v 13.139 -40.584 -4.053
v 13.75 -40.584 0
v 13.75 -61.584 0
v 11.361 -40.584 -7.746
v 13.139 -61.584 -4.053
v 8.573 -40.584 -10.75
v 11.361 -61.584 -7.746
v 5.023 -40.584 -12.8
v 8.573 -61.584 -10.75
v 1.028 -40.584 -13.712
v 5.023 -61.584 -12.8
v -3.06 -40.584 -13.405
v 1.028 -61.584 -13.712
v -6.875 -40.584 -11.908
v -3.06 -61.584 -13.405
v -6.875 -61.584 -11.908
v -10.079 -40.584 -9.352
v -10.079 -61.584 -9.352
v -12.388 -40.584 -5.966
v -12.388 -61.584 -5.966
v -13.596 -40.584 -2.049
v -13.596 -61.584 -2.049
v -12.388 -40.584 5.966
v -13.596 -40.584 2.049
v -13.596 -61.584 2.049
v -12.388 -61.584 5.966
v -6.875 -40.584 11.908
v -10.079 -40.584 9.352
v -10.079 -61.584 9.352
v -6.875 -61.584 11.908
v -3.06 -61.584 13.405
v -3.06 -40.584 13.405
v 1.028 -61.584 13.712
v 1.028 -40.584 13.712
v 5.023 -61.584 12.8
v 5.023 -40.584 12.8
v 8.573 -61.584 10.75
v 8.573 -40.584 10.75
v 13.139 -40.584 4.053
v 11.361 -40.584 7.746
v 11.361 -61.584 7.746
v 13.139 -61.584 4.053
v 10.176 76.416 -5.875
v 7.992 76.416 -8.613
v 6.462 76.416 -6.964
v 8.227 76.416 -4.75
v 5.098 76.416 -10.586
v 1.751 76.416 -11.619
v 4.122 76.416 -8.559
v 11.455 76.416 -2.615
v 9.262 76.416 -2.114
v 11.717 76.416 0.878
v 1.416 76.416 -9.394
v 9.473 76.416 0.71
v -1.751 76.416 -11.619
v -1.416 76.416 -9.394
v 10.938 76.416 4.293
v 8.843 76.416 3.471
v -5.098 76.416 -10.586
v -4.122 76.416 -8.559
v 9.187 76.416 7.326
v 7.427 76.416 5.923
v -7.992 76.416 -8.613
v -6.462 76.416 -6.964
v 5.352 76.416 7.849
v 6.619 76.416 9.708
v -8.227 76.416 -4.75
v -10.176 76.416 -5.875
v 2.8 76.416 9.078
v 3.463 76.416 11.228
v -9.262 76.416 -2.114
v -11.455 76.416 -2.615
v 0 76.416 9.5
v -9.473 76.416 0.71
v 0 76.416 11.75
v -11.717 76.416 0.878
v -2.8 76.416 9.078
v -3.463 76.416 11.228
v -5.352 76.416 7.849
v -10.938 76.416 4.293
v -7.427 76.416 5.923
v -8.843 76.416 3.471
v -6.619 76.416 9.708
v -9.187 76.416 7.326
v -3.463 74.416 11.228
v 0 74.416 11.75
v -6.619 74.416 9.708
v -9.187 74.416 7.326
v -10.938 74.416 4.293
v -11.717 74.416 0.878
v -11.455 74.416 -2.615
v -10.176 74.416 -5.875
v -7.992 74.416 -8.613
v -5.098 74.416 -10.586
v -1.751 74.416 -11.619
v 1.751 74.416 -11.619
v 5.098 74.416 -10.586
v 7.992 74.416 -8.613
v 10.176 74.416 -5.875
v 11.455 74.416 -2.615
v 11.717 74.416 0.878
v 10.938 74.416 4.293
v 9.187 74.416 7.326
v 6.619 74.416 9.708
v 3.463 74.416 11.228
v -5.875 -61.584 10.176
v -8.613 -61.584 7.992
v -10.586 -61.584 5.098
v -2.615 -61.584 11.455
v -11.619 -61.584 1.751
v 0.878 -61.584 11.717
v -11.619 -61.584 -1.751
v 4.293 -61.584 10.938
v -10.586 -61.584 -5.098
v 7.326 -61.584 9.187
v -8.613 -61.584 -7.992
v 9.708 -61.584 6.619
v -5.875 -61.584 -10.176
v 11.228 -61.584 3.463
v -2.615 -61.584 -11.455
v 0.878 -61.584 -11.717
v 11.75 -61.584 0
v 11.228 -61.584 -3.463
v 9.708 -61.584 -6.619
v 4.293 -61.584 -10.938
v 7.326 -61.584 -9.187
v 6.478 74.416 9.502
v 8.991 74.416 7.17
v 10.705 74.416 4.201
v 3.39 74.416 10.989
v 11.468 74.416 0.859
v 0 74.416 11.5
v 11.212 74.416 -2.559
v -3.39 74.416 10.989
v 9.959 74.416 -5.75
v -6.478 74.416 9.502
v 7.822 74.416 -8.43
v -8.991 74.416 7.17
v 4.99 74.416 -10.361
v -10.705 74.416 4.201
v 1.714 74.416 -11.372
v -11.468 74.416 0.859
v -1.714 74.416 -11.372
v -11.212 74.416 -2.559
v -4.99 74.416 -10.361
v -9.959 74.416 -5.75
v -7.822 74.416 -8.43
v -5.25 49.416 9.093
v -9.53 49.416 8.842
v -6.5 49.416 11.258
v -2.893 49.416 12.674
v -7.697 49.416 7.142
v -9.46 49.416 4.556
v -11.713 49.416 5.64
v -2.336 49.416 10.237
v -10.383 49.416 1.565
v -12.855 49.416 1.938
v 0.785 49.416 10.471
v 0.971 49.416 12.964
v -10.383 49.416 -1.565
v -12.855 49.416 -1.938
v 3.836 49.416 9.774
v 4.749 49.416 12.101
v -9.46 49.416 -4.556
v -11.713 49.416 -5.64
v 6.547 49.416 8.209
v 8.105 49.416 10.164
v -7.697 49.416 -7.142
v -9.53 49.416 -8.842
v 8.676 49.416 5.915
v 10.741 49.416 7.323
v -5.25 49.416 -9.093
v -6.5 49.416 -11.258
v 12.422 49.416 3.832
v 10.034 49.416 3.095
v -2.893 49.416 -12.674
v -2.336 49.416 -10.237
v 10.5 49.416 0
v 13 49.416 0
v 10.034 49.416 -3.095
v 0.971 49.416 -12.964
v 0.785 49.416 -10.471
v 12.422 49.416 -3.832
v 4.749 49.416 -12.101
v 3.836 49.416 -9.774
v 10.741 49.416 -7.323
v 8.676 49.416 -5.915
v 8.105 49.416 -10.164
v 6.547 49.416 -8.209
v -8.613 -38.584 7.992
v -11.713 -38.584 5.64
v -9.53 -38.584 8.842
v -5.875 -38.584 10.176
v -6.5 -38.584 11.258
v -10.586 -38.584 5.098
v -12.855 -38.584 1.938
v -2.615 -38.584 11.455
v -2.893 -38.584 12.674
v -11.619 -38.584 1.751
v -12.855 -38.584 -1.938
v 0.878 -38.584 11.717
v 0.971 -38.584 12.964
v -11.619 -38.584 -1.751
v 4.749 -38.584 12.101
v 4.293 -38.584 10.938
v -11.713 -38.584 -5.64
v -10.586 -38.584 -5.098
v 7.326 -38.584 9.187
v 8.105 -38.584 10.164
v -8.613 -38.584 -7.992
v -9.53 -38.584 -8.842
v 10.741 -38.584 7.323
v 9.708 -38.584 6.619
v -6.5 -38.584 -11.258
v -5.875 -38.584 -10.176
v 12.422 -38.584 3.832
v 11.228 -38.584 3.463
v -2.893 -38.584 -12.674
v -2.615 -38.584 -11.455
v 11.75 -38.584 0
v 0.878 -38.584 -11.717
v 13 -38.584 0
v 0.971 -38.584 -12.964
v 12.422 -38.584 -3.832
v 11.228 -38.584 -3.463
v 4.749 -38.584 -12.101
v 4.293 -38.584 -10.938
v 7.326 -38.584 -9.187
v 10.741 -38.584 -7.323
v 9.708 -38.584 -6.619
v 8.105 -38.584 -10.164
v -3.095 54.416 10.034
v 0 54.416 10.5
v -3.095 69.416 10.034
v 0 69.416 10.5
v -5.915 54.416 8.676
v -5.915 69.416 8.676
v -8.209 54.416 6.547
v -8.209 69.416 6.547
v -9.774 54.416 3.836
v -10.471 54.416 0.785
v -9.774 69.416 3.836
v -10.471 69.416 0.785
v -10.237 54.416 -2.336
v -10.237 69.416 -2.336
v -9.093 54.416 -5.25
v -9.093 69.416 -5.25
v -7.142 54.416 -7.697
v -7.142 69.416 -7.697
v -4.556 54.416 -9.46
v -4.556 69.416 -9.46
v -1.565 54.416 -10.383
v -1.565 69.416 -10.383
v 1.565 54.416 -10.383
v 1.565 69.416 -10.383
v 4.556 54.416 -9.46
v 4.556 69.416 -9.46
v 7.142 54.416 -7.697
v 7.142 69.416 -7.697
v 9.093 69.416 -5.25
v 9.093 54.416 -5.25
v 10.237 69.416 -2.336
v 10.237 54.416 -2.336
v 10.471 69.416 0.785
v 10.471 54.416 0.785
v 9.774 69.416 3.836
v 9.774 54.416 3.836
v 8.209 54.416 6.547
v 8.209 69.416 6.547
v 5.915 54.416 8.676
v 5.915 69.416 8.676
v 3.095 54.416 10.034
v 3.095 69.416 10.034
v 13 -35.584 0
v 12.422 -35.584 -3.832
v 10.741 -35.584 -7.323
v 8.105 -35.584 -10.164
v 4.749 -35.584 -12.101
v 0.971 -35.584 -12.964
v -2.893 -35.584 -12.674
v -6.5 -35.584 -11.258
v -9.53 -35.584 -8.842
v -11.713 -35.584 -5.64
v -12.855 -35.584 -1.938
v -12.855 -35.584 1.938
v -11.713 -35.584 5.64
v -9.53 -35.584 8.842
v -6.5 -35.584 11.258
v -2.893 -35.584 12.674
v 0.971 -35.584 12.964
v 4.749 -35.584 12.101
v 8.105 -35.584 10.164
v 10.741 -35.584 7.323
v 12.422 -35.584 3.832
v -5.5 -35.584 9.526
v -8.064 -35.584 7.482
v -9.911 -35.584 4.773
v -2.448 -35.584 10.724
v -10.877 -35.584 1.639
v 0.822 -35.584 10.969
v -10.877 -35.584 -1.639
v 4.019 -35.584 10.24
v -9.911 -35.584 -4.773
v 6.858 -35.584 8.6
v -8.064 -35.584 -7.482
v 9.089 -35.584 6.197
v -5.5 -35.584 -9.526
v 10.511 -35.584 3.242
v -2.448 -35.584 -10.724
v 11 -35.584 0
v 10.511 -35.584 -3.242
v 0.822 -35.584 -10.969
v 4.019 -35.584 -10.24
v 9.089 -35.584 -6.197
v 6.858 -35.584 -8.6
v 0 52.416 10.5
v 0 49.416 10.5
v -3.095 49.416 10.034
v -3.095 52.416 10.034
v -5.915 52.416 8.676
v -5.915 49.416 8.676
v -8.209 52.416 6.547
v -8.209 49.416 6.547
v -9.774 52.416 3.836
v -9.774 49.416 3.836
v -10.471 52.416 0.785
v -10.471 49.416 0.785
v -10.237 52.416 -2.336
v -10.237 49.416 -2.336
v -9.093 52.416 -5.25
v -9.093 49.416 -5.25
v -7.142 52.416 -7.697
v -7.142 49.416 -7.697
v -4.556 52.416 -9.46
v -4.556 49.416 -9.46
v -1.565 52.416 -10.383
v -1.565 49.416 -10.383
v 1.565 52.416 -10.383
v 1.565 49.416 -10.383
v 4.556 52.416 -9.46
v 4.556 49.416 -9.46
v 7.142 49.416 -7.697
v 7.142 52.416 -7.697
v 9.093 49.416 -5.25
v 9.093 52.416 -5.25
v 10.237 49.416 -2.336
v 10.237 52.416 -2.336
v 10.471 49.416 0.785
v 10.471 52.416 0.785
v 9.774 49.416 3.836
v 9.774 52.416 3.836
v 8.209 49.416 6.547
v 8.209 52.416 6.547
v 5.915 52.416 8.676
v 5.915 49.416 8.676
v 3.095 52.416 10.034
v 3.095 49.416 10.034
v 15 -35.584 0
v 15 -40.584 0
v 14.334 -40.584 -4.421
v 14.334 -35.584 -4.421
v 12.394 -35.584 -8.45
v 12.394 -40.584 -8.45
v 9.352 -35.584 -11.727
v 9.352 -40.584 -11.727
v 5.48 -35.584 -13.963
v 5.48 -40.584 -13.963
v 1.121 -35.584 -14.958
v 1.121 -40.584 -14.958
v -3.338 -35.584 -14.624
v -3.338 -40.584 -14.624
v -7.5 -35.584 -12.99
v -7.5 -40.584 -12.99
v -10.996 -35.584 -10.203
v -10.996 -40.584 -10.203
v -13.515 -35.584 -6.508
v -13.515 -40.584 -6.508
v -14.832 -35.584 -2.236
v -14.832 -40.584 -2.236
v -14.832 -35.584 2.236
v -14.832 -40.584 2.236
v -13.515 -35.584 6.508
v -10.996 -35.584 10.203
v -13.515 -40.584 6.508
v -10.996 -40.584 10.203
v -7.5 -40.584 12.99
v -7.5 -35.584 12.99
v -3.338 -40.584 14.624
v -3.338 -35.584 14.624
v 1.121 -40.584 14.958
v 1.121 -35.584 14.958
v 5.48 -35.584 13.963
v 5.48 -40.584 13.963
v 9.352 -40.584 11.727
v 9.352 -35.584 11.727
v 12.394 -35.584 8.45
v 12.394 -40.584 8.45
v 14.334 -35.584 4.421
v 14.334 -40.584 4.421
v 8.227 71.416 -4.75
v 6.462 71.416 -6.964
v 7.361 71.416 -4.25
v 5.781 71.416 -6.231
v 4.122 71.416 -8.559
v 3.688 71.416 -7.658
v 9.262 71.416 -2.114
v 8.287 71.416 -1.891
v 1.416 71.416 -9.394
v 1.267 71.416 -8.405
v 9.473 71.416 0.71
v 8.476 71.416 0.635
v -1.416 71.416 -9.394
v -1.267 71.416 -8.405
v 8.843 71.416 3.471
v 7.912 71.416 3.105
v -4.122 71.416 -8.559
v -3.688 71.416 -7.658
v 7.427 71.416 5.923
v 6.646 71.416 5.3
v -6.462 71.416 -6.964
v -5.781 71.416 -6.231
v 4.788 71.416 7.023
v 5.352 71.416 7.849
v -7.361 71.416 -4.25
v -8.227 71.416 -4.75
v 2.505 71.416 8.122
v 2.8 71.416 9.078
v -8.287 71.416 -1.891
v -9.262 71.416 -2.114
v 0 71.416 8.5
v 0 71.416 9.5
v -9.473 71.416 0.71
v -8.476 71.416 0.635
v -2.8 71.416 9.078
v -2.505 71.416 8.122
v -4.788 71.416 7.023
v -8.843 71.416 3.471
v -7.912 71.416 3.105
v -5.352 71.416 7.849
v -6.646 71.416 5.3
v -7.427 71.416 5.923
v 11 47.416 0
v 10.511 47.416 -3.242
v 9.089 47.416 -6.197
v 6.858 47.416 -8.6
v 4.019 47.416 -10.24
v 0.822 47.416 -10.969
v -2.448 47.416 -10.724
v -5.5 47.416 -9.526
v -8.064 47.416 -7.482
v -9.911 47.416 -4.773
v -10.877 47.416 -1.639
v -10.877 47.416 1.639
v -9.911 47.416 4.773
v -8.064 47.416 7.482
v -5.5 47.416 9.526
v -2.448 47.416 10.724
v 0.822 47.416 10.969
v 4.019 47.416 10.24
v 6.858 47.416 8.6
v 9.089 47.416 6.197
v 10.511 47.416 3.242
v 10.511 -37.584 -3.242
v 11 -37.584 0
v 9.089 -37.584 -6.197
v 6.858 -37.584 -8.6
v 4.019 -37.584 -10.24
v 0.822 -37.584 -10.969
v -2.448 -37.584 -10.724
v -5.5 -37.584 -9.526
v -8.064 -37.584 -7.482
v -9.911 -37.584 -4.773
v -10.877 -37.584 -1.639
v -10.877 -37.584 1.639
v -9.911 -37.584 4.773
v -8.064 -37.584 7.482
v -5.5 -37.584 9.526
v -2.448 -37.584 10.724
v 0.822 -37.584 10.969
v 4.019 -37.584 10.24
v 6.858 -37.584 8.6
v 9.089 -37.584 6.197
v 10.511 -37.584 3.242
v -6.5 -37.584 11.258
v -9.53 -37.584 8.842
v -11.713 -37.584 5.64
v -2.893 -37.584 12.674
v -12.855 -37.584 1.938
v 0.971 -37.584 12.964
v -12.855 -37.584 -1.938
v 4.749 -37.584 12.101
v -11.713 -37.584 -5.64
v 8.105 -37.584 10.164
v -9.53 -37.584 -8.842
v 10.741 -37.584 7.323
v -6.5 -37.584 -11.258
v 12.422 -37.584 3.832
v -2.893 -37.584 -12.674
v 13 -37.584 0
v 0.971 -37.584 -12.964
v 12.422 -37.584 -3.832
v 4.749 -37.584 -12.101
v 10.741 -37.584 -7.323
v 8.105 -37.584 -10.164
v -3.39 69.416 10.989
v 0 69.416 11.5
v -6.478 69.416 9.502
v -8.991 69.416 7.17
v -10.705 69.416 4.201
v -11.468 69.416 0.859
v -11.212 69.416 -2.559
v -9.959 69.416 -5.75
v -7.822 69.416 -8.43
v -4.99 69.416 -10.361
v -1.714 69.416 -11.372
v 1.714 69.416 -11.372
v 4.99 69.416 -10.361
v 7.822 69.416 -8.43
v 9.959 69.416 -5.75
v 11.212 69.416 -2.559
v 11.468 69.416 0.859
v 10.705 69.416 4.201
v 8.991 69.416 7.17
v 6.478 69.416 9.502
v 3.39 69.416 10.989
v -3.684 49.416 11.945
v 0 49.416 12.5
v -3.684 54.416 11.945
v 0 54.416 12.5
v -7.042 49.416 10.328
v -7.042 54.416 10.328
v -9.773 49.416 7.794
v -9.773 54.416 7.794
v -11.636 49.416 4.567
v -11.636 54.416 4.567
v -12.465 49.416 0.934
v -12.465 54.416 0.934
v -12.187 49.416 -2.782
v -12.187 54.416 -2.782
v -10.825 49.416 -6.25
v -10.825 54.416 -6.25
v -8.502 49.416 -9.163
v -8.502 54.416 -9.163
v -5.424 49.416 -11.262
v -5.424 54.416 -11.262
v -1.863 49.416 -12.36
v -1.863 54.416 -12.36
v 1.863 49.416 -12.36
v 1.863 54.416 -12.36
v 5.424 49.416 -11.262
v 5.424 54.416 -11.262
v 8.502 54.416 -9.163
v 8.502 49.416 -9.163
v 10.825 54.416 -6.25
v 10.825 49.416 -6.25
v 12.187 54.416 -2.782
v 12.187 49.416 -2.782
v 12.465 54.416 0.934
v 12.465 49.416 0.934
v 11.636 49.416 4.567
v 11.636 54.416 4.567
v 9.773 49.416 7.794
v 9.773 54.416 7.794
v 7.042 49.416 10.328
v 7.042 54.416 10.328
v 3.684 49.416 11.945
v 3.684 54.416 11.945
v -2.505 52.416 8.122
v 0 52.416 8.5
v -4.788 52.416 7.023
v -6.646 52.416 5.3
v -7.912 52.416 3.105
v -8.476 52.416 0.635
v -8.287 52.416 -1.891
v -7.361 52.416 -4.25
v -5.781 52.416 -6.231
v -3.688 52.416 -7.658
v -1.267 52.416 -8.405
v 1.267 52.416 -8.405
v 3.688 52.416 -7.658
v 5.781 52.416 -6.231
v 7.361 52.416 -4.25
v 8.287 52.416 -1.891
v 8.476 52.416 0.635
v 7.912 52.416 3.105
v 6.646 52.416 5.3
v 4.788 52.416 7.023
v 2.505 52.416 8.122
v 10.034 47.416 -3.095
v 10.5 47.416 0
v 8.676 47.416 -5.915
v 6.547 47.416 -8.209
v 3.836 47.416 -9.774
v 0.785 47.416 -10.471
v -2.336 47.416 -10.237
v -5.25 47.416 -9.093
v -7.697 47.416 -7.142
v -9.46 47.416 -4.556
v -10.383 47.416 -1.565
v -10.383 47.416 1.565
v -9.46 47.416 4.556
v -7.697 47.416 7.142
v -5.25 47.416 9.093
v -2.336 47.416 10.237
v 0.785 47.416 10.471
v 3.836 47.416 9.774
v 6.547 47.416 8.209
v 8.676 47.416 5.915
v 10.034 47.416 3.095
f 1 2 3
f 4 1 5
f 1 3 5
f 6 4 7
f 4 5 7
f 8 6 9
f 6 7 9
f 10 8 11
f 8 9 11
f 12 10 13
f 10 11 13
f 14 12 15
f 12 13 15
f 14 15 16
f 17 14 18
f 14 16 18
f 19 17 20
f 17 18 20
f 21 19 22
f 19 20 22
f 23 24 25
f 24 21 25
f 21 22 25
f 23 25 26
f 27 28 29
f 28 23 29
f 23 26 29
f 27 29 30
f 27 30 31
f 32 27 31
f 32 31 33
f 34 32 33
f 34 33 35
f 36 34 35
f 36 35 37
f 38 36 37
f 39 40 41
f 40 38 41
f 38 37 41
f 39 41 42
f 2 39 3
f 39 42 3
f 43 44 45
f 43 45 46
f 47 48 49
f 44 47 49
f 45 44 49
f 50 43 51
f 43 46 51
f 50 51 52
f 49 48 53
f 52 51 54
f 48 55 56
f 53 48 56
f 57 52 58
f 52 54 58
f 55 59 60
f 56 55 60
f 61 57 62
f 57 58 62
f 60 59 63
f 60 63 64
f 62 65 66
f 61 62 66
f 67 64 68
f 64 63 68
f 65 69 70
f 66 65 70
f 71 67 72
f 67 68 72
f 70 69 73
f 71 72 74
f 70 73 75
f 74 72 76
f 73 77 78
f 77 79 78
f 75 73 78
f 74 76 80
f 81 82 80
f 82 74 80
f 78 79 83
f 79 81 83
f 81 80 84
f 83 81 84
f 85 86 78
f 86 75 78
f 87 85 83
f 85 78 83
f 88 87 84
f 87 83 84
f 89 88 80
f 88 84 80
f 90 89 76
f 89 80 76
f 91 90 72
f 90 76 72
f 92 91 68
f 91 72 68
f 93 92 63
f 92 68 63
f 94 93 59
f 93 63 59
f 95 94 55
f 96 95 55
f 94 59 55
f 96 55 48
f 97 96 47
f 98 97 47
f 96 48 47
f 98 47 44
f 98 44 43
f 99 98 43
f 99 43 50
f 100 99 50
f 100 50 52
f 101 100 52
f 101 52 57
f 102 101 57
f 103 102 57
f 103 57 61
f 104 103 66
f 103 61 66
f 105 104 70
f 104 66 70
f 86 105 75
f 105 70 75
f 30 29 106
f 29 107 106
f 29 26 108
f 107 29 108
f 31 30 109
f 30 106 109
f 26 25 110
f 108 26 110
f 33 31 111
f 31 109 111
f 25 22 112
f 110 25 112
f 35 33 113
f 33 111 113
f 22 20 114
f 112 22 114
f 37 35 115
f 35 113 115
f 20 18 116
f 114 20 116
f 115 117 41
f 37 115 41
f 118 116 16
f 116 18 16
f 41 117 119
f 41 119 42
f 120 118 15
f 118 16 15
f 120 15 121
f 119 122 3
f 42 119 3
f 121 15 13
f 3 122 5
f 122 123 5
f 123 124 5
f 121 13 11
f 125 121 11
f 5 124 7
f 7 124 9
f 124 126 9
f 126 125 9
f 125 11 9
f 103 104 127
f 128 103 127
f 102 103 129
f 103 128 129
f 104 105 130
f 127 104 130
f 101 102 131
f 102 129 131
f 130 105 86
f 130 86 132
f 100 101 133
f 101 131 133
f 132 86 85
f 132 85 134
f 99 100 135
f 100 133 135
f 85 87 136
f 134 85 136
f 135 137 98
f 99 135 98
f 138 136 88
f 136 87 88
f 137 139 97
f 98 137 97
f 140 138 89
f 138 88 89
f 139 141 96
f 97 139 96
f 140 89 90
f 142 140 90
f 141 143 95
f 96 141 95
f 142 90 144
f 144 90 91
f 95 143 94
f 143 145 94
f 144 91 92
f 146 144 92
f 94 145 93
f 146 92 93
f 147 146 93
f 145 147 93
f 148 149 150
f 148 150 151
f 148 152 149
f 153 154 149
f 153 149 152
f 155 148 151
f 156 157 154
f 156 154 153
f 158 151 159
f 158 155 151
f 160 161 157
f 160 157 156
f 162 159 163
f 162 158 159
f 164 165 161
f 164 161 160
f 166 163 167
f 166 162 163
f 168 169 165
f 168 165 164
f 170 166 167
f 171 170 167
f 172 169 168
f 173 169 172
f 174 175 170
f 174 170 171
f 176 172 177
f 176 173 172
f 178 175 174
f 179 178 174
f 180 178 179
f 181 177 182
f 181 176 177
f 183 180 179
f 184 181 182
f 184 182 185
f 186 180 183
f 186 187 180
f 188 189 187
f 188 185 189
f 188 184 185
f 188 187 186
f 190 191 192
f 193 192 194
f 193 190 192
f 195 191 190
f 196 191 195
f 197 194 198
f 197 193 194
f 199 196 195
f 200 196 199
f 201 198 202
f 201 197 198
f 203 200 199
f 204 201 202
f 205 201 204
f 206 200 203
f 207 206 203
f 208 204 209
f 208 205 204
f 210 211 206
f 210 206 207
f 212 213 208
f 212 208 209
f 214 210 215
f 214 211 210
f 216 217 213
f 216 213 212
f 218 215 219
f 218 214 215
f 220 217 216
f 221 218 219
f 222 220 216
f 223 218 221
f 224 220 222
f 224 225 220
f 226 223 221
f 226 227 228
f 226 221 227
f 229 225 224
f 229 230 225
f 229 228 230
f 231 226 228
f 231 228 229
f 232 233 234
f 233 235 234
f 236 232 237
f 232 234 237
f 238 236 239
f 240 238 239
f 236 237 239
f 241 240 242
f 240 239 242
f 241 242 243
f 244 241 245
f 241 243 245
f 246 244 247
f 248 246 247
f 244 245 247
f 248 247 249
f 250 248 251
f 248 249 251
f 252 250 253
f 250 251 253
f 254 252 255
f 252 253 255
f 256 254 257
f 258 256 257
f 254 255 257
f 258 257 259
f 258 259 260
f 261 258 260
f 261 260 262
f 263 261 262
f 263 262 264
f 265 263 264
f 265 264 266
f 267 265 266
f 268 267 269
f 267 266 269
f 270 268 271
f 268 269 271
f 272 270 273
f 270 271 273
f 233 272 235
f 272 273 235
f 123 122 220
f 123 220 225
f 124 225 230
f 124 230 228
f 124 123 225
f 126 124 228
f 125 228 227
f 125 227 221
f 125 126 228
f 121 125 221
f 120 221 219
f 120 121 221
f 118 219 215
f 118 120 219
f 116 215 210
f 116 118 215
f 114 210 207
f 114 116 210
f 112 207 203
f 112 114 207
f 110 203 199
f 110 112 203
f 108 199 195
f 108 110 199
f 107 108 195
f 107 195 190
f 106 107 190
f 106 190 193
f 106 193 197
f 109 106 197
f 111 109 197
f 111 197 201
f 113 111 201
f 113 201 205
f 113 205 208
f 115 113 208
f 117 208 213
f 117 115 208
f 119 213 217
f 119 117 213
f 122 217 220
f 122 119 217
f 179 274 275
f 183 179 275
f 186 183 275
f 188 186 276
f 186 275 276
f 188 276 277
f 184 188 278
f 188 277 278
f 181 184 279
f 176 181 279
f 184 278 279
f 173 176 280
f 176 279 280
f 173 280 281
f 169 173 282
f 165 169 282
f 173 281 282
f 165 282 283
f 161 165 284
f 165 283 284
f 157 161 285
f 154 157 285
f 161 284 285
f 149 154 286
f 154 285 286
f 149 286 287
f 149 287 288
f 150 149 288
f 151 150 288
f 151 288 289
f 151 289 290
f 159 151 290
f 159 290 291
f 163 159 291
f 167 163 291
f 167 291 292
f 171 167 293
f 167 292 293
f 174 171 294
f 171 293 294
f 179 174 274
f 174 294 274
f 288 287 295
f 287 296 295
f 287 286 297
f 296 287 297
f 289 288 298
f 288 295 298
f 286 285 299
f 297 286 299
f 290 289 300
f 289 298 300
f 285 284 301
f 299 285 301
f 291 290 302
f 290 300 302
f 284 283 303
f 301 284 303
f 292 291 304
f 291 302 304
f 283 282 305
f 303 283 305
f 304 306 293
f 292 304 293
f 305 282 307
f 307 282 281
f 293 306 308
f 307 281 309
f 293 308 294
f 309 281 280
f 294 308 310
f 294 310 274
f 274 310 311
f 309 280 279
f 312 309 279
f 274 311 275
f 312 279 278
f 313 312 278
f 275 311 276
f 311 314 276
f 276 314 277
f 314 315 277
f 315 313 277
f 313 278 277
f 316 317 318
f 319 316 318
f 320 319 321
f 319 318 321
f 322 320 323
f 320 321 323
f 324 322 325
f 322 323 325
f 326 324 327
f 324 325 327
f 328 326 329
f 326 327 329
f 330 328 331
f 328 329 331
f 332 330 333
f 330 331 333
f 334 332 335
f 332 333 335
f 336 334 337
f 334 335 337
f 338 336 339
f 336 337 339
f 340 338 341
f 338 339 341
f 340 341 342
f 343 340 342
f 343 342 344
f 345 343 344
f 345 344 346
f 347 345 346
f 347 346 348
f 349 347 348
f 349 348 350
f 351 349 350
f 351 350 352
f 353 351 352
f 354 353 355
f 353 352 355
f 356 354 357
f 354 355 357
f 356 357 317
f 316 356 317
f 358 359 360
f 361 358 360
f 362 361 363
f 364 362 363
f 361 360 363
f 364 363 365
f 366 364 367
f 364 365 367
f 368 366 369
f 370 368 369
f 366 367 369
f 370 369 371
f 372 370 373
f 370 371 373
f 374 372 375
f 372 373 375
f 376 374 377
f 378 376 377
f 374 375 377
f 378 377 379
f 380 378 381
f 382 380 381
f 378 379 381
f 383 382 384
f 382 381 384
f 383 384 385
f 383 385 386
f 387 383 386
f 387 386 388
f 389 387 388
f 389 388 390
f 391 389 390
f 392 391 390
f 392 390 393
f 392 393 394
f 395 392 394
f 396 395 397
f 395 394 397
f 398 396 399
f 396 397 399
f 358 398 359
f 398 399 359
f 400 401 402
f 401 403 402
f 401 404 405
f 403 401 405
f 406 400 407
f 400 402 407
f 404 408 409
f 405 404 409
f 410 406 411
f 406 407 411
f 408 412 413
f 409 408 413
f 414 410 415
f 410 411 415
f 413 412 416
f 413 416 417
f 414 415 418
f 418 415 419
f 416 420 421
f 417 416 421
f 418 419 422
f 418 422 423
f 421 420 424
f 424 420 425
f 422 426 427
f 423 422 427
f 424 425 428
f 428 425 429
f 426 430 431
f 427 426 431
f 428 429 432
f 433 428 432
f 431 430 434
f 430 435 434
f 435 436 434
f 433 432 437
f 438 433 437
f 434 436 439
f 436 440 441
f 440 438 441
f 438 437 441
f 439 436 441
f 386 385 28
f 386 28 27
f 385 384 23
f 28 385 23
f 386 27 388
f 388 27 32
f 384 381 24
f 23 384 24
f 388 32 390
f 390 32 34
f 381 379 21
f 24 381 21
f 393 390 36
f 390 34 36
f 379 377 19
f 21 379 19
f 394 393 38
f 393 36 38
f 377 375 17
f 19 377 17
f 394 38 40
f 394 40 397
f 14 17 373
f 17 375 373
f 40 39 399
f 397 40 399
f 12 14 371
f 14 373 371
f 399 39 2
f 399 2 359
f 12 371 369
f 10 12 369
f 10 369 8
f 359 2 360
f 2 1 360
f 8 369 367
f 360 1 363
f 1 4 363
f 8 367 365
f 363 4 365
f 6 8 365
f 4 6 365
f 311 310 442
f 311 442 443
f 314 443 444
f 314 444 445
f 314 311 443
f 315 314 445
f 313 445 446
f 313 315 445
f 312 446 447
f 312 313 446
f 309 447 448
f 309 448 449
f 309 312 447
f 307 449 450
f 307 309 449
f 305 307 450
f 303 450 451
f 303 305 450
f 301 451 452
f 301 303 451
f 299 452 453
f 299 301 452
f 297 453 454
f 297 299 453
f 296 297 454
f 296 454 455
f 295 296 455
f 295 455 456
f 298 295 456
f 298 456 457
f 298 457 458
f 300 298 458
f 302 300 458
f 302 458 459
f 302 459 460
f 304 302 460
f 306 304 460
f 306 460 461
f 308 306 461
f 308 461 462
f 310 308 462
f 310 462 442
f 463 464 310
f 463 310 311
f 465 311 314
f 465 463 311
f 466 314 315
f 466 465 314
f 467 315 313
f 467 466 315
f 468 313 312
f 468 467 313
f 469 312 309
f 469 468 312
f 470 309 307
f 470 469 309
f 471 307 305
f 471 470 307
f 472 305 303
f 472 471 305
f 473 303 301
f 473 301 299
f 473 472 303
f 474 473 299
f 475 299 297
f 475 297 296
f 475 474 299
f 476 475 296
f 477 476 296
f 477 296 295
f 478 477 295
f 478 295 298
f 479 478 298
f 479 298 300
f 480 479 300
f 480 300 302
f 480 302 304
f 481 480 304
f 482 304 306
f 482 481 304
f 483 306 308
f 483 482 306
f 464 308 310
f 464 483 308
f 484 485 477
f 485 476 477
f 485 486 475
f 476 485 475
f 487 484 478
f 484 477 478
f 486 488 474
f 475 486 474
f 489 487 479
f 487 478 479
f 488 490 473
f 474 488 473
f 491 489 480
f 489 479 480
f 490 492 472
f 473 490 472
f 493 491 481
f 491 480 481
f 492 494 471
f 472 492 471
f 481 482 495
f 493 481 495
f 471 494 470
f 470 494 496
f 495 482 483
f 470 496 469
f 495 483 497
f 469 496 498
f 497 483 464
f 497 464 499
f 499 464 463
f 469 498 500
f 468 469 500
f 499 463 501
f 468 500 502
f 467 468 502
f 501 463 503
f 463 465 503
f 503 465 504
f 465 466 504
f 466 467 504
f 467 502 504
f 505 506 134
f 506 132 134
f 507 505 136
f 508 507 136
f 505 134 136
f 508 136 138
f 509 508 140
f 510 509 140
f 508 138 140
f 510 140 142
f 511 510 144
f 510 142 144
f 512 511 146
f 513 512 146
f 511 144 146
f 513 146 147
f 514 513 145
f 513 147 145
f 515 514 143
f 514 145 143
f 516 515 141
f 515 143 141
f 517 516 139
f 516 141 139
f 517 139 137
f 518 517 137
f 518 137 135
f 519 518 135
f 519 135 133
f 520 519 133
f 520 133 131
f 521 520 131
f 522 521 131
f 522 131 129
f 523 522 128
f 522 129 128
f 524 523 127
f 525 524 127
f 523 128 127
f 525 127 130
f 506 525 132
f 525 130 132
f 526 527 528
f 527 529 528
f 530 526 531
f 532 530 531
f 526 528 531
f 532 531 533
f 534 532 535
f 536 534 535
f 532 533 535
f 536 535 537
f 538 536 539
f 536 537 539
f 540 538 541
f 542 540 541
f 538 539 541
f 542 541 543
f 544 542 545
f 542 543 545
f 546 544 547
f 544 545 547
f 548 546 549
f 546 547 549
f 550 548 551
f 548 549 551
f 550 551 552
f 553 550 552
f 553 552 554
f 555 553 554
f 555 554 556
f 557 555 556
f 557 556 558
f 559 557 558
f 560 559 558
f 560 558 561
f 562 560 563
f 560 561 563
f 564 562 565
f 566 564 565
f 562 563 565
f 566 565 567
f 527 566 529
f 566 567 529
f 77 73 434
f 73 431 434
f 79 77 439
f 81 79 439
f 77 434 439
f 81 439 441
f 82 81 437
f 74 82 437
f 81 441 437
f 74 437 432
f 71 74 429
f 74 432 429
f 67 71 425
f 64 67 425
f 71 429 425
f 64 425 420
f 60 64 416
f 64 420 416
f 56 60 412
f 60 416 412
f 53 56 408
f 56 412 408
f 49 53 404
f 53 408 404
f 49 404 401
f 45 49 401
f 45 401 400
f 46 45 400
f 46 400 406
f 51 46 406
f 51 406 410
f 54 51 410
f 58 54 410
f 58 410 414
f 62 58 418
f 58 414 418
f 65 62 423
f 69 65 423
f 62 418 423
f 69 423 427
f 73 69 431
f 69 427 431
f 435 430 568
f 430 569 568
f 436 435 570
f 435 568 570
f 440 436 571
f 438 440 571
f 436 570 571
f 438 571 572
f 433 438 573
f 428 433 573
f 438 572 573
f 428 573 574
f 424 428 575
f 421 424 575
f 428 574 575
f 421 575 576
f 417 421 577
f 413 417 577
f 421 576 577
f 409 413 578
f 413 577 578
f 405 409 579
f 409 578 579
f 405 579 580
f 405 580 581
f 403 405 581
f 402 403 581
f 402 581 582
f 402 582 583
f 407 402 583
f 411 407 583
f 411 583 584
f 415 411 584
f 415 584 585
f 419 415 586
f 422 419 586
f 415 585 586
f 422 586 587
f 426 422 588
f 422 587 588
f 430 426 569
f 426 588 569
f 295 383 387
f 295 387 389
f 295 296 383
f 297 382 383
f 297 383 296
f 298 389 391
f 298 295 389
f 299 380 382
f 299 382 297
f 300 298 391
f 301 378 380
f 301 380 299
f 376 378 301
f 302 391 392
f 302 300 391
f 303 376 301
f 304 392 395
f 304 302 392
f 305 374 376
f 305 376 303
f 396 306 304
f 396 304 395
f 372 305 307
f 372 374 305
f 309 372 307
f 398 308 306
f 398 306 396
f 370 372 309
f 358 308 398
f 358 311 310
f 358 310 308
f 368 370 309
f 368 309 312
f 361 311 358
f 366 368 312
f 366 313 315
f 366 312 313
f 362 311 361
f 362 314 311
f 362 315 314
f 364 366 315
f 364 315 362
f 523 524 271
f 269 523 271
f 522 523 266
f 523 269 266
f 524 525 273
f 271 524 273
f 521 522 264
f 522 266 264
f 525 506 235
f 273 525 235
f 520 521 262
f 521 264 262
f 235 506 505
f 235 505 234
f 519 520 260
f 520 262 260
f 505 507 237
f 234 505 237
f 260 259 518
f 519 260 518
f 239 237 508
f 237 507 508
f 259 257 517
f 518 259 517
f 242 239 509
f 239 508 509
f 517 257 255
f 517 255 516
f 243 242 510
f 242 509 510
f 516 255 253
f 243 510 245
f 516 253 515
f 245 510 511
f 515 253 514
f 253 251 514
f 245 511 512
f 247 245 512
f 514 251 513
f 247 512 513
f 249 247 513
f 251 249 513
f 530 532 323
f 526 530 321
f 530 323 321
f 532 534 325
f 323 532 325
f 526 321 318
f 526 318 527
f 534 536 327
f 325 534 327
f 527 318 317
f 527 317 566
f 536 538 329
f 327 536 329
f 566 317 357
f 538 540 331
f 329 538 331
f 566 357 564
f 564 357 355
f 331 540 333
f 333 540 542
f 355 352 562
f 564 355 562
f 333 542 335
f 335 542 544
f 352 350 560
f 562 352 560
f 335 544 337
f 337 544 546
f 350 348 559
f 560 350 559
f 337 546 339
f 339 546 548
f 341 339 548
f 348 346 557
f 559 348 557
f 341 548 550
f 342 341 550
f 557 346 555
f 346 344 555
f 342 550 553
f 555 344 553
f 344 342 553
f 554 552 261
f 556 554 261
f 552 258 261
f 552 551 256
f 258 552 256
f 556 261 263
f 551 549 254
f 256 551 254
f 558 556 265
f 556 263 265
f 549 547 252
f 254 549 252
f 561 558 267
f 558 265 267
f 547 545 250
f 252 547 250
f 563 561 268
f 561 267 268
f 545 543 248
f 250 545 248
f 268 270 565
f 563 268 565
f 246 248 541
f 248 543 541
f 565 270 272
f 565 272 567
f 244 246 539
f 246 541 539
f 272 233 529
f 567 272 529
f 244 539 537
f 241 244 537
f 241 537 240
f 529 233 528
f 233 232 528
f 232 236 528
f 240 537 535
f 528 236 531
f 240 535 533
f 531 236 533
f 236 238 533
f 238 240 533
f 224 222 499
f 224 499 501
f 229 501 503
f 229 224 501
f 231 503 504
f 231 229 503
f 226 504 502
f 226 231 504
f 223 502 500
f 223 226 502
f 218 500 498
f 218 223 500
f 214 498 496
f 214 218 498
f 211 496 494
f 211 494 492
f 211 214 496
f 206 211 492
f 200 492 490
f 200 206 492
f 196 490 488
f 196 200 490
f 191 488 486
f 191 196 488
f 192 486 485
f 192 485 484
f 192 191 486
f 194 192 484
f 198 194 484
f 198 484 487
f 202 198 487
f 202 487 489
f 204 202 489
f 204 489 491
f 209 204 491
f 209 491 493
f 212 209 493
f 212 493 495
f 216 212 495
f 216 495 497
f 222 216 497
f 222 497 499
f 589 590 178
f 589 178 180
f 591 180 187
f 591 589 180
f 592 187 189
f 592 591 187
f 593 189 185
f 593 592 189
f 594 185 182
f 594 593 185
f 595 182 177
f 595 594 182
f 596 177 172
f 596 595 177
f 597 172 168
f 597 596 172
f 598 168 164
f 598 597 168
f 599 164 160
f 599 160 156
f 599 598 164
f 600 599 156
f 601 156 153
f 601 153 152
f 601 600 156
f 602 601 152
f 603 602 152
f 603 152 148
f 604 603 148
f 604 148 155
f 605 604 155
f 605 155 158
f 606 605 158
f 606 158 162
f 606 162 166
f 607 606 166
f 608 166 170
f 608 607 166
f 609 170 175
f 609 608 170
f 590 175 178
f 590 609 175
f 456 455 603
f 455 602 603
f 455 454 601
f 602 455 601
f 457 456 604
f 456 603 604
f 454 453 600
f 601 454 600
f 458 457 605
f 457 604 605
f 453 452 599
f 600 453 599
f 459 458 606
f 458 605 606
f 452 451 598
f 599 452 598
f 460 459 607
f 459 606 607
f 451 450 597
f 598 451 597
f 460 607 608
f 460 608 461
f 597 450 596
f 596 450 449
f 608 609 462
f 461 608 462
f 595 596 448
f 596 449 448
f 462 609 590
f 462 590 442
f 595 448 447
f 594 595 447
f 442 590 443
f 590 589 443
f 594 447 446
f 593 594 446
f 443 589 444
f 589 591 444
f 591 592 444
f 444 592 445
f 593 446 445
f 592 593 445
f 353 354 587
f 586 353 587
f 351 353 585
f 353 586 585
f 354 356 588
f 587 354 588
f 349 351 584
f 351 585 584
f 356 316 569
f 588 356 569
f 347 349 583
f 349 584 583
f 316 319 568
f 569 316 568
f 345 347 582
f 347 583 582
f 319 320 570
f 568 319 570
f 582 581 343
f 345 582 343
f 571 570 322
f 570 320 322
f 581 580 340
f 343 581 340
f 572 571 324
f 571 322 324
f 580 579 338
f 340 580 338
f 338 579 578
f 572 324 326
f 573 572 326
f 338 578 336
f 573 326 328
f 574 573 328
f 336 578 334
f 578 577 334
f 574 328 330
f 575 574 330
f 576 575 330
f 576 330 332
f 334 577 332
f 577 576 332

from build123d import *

# Parameters (mm, degrees)
PARTIR1_START         = -61.583819077
PARTIR1_OUTLINE_R     = 13.75
PARTIR1_OUTLINE_R_2   = 11.75
PARTIR1_DEPTH         = 23
PARTIR1_START_2       = -40.583819077
PARTIR1_2_OUTLINE_R   = 15
PARTIR1_2_OUTLINE_R_2 = 13
PARTIR1_2_DEPTH       = 5
PARTIR1_START_3       = -37.583819077
PARTIR1_3_OUTLINE_R   = 13
PARTIR1_3_OUTLINE_R_2 = 11
PARTIR1_3_DEPTH       = 2
PARTIR1_4_OUTLINE_R   = 15
PARTIR1_4_OUTLINE_R_2 = 10.5
PARTIR1_4_DEPTH       = 111
PARTIR1_START_4       = -35.583819077
PARTIR1_5_OUTLINE_R   = 13
PARTIR1_5_OUTLINE_R_2 = 11
PARTIR1_5_DEPTH       = 85
PARTIR1_START_5       = 47.416180923
PARTIR1_6_OUTLINE_R   = 11
PARTIR1_6_OUTLINE_R_2 = 10.5
PARTIR1_6_DEPTH       = 2


# Read off the part's stored shape, not the designer's step: Partir1
with BuildPart() as part:
    # Croquis1 → Revolución1 (revolve)
    with BuildSketch(Plane.XY, mode=Mode.PRIVATE) as revoluci_n1_sk:
        Polygon((11.75, -61.583819077), (13.75, -61.583819077), (13.75, -40.583819077), (15, -40.583819077), (15, -35.583819077), (13, -35.583819077), (13, 49.416180923), (12.5, 49.416180923), (12.5, 54.416180923), (10.5, 54.416180923), (10.5, 69.416180923), (11.5, 69.416180923), (11.5, 74.416180923), (11.75, 74.416180923), (11.75, 76.416180923), (9.5, 76.416180923), (9.5, 71.416180923), (8.5, 71.416180923), (8.5, 52.416180923), (10.5, 52.416180923), (10.5, 47.416180923), (11, 47.416180923), (11, -37.583819077), (13, -37.583819077), (13, -38.583819077), (11.75, -38.583819077), (11.75, -59.583819077), align=None)
    revolve(revoluci_n1_sk.sketch.rotate(Axis((0, 74.416180923, 0), (0, -1, 0)), 90), axis=Axis((0, 74.416180923, 0), (0, -1, 0)))

    # Partir1 4 outline → Partir1 4 (cut)
    with BuildSketch(Plane(origin=(0, 0, 0), x_dir=(1, 0, 0), z_dir=(0, 1, 0)).offset(PARTIR1_START)):
        Circle(PARTIR1_4_OUTLINE_R)
        Circle(PARTIR1_4_OUTLINE_R_2, mode=Mode.SUBTRACT)
    extrude(amount=PARTIR1_4_DEPTH, mode=Mode.SUBTRACT)


with BuildPart() as body_2:
    # Partir1 outline → Partir1 (new body)
    with BuildSketch(Plane(origin=(0, 0, 0), x_dir=(1, 0, 0), z_dir=(0, 1, 0)).offset(PARTIR1_START)):
        Circle(PARTIR1_OUTLINE_R)
        Circle(PARTIR1_OUTLINE_R_2, mode=Mode.SUBTRACT)
    extrude(amount=PARTIR1_DEPTH)

    # Partir1 2 outline → Partir1 2 (add)
    with BuildSketch(Plane(origin=(0, 0, 0), x_dir=(1, 0, 0), z_dir=(0, 1, 0)).offset(PARTIR1_START_2)):
        Circle(PARTIR1_2_OUTLINE_R)
        Circle(PARTIR1_2_OUTLINE_R_2, mode=Mode.SUBTRACT)
    extrude(amount=PARTIR1_2_DEPTH)

    # Partir1 3 outline → Partir1 3 (add)
    with BuildSketch(Plane(origin=(0, 0, 0), x_dir=(1, 0, 0), z_dir=(0, 1, 0)).offset(PARTIR1_START_3)):
        Circle(PARTIR1_3_OUTLINE_R)
        Circle(PARTIR1_3_OUTLINE_R_2, mode=Mode.SUBTRACT)
    extrude(amount=PARTIR1_3_DEPTH)


with BuildPart() as body_3:
    # Partir1 5 outline → Partir1 5 (new body)
    with BuildSketch(Plane(origin=(0, 0, 0), x_dir=(1, 0, 0), z_dir=(0, 1, 0)).offset(PARTIR1_START_4)):
        Circle(PARTIR1_5_OUTLINE_R)
        Circle(PARTIR1_5_OUTLINE_R_2, mode=Mode.SUBTRACT)
    extrude(amount=PARTIR1_5_DEPTH)

    # Partir1 6 outline → Partir1 6 (add)
    with BuildSketch(Plane(origin=(0, 0, 0), x_dir=(1, 0, 0), z_dir=(0, 1, 0)).offset(PARTIR1_START_5)):
        Circle(PARTIR1_6_OUTLINE_R)
        Circle(PARTIR1_6_OUTLINE_R_2, mode=Mode.SUBTRACT)
    extrude(amount=PARTIR1_6_DEPTH)


solid = Compound([part.part, body_2.part, body_3.part])
